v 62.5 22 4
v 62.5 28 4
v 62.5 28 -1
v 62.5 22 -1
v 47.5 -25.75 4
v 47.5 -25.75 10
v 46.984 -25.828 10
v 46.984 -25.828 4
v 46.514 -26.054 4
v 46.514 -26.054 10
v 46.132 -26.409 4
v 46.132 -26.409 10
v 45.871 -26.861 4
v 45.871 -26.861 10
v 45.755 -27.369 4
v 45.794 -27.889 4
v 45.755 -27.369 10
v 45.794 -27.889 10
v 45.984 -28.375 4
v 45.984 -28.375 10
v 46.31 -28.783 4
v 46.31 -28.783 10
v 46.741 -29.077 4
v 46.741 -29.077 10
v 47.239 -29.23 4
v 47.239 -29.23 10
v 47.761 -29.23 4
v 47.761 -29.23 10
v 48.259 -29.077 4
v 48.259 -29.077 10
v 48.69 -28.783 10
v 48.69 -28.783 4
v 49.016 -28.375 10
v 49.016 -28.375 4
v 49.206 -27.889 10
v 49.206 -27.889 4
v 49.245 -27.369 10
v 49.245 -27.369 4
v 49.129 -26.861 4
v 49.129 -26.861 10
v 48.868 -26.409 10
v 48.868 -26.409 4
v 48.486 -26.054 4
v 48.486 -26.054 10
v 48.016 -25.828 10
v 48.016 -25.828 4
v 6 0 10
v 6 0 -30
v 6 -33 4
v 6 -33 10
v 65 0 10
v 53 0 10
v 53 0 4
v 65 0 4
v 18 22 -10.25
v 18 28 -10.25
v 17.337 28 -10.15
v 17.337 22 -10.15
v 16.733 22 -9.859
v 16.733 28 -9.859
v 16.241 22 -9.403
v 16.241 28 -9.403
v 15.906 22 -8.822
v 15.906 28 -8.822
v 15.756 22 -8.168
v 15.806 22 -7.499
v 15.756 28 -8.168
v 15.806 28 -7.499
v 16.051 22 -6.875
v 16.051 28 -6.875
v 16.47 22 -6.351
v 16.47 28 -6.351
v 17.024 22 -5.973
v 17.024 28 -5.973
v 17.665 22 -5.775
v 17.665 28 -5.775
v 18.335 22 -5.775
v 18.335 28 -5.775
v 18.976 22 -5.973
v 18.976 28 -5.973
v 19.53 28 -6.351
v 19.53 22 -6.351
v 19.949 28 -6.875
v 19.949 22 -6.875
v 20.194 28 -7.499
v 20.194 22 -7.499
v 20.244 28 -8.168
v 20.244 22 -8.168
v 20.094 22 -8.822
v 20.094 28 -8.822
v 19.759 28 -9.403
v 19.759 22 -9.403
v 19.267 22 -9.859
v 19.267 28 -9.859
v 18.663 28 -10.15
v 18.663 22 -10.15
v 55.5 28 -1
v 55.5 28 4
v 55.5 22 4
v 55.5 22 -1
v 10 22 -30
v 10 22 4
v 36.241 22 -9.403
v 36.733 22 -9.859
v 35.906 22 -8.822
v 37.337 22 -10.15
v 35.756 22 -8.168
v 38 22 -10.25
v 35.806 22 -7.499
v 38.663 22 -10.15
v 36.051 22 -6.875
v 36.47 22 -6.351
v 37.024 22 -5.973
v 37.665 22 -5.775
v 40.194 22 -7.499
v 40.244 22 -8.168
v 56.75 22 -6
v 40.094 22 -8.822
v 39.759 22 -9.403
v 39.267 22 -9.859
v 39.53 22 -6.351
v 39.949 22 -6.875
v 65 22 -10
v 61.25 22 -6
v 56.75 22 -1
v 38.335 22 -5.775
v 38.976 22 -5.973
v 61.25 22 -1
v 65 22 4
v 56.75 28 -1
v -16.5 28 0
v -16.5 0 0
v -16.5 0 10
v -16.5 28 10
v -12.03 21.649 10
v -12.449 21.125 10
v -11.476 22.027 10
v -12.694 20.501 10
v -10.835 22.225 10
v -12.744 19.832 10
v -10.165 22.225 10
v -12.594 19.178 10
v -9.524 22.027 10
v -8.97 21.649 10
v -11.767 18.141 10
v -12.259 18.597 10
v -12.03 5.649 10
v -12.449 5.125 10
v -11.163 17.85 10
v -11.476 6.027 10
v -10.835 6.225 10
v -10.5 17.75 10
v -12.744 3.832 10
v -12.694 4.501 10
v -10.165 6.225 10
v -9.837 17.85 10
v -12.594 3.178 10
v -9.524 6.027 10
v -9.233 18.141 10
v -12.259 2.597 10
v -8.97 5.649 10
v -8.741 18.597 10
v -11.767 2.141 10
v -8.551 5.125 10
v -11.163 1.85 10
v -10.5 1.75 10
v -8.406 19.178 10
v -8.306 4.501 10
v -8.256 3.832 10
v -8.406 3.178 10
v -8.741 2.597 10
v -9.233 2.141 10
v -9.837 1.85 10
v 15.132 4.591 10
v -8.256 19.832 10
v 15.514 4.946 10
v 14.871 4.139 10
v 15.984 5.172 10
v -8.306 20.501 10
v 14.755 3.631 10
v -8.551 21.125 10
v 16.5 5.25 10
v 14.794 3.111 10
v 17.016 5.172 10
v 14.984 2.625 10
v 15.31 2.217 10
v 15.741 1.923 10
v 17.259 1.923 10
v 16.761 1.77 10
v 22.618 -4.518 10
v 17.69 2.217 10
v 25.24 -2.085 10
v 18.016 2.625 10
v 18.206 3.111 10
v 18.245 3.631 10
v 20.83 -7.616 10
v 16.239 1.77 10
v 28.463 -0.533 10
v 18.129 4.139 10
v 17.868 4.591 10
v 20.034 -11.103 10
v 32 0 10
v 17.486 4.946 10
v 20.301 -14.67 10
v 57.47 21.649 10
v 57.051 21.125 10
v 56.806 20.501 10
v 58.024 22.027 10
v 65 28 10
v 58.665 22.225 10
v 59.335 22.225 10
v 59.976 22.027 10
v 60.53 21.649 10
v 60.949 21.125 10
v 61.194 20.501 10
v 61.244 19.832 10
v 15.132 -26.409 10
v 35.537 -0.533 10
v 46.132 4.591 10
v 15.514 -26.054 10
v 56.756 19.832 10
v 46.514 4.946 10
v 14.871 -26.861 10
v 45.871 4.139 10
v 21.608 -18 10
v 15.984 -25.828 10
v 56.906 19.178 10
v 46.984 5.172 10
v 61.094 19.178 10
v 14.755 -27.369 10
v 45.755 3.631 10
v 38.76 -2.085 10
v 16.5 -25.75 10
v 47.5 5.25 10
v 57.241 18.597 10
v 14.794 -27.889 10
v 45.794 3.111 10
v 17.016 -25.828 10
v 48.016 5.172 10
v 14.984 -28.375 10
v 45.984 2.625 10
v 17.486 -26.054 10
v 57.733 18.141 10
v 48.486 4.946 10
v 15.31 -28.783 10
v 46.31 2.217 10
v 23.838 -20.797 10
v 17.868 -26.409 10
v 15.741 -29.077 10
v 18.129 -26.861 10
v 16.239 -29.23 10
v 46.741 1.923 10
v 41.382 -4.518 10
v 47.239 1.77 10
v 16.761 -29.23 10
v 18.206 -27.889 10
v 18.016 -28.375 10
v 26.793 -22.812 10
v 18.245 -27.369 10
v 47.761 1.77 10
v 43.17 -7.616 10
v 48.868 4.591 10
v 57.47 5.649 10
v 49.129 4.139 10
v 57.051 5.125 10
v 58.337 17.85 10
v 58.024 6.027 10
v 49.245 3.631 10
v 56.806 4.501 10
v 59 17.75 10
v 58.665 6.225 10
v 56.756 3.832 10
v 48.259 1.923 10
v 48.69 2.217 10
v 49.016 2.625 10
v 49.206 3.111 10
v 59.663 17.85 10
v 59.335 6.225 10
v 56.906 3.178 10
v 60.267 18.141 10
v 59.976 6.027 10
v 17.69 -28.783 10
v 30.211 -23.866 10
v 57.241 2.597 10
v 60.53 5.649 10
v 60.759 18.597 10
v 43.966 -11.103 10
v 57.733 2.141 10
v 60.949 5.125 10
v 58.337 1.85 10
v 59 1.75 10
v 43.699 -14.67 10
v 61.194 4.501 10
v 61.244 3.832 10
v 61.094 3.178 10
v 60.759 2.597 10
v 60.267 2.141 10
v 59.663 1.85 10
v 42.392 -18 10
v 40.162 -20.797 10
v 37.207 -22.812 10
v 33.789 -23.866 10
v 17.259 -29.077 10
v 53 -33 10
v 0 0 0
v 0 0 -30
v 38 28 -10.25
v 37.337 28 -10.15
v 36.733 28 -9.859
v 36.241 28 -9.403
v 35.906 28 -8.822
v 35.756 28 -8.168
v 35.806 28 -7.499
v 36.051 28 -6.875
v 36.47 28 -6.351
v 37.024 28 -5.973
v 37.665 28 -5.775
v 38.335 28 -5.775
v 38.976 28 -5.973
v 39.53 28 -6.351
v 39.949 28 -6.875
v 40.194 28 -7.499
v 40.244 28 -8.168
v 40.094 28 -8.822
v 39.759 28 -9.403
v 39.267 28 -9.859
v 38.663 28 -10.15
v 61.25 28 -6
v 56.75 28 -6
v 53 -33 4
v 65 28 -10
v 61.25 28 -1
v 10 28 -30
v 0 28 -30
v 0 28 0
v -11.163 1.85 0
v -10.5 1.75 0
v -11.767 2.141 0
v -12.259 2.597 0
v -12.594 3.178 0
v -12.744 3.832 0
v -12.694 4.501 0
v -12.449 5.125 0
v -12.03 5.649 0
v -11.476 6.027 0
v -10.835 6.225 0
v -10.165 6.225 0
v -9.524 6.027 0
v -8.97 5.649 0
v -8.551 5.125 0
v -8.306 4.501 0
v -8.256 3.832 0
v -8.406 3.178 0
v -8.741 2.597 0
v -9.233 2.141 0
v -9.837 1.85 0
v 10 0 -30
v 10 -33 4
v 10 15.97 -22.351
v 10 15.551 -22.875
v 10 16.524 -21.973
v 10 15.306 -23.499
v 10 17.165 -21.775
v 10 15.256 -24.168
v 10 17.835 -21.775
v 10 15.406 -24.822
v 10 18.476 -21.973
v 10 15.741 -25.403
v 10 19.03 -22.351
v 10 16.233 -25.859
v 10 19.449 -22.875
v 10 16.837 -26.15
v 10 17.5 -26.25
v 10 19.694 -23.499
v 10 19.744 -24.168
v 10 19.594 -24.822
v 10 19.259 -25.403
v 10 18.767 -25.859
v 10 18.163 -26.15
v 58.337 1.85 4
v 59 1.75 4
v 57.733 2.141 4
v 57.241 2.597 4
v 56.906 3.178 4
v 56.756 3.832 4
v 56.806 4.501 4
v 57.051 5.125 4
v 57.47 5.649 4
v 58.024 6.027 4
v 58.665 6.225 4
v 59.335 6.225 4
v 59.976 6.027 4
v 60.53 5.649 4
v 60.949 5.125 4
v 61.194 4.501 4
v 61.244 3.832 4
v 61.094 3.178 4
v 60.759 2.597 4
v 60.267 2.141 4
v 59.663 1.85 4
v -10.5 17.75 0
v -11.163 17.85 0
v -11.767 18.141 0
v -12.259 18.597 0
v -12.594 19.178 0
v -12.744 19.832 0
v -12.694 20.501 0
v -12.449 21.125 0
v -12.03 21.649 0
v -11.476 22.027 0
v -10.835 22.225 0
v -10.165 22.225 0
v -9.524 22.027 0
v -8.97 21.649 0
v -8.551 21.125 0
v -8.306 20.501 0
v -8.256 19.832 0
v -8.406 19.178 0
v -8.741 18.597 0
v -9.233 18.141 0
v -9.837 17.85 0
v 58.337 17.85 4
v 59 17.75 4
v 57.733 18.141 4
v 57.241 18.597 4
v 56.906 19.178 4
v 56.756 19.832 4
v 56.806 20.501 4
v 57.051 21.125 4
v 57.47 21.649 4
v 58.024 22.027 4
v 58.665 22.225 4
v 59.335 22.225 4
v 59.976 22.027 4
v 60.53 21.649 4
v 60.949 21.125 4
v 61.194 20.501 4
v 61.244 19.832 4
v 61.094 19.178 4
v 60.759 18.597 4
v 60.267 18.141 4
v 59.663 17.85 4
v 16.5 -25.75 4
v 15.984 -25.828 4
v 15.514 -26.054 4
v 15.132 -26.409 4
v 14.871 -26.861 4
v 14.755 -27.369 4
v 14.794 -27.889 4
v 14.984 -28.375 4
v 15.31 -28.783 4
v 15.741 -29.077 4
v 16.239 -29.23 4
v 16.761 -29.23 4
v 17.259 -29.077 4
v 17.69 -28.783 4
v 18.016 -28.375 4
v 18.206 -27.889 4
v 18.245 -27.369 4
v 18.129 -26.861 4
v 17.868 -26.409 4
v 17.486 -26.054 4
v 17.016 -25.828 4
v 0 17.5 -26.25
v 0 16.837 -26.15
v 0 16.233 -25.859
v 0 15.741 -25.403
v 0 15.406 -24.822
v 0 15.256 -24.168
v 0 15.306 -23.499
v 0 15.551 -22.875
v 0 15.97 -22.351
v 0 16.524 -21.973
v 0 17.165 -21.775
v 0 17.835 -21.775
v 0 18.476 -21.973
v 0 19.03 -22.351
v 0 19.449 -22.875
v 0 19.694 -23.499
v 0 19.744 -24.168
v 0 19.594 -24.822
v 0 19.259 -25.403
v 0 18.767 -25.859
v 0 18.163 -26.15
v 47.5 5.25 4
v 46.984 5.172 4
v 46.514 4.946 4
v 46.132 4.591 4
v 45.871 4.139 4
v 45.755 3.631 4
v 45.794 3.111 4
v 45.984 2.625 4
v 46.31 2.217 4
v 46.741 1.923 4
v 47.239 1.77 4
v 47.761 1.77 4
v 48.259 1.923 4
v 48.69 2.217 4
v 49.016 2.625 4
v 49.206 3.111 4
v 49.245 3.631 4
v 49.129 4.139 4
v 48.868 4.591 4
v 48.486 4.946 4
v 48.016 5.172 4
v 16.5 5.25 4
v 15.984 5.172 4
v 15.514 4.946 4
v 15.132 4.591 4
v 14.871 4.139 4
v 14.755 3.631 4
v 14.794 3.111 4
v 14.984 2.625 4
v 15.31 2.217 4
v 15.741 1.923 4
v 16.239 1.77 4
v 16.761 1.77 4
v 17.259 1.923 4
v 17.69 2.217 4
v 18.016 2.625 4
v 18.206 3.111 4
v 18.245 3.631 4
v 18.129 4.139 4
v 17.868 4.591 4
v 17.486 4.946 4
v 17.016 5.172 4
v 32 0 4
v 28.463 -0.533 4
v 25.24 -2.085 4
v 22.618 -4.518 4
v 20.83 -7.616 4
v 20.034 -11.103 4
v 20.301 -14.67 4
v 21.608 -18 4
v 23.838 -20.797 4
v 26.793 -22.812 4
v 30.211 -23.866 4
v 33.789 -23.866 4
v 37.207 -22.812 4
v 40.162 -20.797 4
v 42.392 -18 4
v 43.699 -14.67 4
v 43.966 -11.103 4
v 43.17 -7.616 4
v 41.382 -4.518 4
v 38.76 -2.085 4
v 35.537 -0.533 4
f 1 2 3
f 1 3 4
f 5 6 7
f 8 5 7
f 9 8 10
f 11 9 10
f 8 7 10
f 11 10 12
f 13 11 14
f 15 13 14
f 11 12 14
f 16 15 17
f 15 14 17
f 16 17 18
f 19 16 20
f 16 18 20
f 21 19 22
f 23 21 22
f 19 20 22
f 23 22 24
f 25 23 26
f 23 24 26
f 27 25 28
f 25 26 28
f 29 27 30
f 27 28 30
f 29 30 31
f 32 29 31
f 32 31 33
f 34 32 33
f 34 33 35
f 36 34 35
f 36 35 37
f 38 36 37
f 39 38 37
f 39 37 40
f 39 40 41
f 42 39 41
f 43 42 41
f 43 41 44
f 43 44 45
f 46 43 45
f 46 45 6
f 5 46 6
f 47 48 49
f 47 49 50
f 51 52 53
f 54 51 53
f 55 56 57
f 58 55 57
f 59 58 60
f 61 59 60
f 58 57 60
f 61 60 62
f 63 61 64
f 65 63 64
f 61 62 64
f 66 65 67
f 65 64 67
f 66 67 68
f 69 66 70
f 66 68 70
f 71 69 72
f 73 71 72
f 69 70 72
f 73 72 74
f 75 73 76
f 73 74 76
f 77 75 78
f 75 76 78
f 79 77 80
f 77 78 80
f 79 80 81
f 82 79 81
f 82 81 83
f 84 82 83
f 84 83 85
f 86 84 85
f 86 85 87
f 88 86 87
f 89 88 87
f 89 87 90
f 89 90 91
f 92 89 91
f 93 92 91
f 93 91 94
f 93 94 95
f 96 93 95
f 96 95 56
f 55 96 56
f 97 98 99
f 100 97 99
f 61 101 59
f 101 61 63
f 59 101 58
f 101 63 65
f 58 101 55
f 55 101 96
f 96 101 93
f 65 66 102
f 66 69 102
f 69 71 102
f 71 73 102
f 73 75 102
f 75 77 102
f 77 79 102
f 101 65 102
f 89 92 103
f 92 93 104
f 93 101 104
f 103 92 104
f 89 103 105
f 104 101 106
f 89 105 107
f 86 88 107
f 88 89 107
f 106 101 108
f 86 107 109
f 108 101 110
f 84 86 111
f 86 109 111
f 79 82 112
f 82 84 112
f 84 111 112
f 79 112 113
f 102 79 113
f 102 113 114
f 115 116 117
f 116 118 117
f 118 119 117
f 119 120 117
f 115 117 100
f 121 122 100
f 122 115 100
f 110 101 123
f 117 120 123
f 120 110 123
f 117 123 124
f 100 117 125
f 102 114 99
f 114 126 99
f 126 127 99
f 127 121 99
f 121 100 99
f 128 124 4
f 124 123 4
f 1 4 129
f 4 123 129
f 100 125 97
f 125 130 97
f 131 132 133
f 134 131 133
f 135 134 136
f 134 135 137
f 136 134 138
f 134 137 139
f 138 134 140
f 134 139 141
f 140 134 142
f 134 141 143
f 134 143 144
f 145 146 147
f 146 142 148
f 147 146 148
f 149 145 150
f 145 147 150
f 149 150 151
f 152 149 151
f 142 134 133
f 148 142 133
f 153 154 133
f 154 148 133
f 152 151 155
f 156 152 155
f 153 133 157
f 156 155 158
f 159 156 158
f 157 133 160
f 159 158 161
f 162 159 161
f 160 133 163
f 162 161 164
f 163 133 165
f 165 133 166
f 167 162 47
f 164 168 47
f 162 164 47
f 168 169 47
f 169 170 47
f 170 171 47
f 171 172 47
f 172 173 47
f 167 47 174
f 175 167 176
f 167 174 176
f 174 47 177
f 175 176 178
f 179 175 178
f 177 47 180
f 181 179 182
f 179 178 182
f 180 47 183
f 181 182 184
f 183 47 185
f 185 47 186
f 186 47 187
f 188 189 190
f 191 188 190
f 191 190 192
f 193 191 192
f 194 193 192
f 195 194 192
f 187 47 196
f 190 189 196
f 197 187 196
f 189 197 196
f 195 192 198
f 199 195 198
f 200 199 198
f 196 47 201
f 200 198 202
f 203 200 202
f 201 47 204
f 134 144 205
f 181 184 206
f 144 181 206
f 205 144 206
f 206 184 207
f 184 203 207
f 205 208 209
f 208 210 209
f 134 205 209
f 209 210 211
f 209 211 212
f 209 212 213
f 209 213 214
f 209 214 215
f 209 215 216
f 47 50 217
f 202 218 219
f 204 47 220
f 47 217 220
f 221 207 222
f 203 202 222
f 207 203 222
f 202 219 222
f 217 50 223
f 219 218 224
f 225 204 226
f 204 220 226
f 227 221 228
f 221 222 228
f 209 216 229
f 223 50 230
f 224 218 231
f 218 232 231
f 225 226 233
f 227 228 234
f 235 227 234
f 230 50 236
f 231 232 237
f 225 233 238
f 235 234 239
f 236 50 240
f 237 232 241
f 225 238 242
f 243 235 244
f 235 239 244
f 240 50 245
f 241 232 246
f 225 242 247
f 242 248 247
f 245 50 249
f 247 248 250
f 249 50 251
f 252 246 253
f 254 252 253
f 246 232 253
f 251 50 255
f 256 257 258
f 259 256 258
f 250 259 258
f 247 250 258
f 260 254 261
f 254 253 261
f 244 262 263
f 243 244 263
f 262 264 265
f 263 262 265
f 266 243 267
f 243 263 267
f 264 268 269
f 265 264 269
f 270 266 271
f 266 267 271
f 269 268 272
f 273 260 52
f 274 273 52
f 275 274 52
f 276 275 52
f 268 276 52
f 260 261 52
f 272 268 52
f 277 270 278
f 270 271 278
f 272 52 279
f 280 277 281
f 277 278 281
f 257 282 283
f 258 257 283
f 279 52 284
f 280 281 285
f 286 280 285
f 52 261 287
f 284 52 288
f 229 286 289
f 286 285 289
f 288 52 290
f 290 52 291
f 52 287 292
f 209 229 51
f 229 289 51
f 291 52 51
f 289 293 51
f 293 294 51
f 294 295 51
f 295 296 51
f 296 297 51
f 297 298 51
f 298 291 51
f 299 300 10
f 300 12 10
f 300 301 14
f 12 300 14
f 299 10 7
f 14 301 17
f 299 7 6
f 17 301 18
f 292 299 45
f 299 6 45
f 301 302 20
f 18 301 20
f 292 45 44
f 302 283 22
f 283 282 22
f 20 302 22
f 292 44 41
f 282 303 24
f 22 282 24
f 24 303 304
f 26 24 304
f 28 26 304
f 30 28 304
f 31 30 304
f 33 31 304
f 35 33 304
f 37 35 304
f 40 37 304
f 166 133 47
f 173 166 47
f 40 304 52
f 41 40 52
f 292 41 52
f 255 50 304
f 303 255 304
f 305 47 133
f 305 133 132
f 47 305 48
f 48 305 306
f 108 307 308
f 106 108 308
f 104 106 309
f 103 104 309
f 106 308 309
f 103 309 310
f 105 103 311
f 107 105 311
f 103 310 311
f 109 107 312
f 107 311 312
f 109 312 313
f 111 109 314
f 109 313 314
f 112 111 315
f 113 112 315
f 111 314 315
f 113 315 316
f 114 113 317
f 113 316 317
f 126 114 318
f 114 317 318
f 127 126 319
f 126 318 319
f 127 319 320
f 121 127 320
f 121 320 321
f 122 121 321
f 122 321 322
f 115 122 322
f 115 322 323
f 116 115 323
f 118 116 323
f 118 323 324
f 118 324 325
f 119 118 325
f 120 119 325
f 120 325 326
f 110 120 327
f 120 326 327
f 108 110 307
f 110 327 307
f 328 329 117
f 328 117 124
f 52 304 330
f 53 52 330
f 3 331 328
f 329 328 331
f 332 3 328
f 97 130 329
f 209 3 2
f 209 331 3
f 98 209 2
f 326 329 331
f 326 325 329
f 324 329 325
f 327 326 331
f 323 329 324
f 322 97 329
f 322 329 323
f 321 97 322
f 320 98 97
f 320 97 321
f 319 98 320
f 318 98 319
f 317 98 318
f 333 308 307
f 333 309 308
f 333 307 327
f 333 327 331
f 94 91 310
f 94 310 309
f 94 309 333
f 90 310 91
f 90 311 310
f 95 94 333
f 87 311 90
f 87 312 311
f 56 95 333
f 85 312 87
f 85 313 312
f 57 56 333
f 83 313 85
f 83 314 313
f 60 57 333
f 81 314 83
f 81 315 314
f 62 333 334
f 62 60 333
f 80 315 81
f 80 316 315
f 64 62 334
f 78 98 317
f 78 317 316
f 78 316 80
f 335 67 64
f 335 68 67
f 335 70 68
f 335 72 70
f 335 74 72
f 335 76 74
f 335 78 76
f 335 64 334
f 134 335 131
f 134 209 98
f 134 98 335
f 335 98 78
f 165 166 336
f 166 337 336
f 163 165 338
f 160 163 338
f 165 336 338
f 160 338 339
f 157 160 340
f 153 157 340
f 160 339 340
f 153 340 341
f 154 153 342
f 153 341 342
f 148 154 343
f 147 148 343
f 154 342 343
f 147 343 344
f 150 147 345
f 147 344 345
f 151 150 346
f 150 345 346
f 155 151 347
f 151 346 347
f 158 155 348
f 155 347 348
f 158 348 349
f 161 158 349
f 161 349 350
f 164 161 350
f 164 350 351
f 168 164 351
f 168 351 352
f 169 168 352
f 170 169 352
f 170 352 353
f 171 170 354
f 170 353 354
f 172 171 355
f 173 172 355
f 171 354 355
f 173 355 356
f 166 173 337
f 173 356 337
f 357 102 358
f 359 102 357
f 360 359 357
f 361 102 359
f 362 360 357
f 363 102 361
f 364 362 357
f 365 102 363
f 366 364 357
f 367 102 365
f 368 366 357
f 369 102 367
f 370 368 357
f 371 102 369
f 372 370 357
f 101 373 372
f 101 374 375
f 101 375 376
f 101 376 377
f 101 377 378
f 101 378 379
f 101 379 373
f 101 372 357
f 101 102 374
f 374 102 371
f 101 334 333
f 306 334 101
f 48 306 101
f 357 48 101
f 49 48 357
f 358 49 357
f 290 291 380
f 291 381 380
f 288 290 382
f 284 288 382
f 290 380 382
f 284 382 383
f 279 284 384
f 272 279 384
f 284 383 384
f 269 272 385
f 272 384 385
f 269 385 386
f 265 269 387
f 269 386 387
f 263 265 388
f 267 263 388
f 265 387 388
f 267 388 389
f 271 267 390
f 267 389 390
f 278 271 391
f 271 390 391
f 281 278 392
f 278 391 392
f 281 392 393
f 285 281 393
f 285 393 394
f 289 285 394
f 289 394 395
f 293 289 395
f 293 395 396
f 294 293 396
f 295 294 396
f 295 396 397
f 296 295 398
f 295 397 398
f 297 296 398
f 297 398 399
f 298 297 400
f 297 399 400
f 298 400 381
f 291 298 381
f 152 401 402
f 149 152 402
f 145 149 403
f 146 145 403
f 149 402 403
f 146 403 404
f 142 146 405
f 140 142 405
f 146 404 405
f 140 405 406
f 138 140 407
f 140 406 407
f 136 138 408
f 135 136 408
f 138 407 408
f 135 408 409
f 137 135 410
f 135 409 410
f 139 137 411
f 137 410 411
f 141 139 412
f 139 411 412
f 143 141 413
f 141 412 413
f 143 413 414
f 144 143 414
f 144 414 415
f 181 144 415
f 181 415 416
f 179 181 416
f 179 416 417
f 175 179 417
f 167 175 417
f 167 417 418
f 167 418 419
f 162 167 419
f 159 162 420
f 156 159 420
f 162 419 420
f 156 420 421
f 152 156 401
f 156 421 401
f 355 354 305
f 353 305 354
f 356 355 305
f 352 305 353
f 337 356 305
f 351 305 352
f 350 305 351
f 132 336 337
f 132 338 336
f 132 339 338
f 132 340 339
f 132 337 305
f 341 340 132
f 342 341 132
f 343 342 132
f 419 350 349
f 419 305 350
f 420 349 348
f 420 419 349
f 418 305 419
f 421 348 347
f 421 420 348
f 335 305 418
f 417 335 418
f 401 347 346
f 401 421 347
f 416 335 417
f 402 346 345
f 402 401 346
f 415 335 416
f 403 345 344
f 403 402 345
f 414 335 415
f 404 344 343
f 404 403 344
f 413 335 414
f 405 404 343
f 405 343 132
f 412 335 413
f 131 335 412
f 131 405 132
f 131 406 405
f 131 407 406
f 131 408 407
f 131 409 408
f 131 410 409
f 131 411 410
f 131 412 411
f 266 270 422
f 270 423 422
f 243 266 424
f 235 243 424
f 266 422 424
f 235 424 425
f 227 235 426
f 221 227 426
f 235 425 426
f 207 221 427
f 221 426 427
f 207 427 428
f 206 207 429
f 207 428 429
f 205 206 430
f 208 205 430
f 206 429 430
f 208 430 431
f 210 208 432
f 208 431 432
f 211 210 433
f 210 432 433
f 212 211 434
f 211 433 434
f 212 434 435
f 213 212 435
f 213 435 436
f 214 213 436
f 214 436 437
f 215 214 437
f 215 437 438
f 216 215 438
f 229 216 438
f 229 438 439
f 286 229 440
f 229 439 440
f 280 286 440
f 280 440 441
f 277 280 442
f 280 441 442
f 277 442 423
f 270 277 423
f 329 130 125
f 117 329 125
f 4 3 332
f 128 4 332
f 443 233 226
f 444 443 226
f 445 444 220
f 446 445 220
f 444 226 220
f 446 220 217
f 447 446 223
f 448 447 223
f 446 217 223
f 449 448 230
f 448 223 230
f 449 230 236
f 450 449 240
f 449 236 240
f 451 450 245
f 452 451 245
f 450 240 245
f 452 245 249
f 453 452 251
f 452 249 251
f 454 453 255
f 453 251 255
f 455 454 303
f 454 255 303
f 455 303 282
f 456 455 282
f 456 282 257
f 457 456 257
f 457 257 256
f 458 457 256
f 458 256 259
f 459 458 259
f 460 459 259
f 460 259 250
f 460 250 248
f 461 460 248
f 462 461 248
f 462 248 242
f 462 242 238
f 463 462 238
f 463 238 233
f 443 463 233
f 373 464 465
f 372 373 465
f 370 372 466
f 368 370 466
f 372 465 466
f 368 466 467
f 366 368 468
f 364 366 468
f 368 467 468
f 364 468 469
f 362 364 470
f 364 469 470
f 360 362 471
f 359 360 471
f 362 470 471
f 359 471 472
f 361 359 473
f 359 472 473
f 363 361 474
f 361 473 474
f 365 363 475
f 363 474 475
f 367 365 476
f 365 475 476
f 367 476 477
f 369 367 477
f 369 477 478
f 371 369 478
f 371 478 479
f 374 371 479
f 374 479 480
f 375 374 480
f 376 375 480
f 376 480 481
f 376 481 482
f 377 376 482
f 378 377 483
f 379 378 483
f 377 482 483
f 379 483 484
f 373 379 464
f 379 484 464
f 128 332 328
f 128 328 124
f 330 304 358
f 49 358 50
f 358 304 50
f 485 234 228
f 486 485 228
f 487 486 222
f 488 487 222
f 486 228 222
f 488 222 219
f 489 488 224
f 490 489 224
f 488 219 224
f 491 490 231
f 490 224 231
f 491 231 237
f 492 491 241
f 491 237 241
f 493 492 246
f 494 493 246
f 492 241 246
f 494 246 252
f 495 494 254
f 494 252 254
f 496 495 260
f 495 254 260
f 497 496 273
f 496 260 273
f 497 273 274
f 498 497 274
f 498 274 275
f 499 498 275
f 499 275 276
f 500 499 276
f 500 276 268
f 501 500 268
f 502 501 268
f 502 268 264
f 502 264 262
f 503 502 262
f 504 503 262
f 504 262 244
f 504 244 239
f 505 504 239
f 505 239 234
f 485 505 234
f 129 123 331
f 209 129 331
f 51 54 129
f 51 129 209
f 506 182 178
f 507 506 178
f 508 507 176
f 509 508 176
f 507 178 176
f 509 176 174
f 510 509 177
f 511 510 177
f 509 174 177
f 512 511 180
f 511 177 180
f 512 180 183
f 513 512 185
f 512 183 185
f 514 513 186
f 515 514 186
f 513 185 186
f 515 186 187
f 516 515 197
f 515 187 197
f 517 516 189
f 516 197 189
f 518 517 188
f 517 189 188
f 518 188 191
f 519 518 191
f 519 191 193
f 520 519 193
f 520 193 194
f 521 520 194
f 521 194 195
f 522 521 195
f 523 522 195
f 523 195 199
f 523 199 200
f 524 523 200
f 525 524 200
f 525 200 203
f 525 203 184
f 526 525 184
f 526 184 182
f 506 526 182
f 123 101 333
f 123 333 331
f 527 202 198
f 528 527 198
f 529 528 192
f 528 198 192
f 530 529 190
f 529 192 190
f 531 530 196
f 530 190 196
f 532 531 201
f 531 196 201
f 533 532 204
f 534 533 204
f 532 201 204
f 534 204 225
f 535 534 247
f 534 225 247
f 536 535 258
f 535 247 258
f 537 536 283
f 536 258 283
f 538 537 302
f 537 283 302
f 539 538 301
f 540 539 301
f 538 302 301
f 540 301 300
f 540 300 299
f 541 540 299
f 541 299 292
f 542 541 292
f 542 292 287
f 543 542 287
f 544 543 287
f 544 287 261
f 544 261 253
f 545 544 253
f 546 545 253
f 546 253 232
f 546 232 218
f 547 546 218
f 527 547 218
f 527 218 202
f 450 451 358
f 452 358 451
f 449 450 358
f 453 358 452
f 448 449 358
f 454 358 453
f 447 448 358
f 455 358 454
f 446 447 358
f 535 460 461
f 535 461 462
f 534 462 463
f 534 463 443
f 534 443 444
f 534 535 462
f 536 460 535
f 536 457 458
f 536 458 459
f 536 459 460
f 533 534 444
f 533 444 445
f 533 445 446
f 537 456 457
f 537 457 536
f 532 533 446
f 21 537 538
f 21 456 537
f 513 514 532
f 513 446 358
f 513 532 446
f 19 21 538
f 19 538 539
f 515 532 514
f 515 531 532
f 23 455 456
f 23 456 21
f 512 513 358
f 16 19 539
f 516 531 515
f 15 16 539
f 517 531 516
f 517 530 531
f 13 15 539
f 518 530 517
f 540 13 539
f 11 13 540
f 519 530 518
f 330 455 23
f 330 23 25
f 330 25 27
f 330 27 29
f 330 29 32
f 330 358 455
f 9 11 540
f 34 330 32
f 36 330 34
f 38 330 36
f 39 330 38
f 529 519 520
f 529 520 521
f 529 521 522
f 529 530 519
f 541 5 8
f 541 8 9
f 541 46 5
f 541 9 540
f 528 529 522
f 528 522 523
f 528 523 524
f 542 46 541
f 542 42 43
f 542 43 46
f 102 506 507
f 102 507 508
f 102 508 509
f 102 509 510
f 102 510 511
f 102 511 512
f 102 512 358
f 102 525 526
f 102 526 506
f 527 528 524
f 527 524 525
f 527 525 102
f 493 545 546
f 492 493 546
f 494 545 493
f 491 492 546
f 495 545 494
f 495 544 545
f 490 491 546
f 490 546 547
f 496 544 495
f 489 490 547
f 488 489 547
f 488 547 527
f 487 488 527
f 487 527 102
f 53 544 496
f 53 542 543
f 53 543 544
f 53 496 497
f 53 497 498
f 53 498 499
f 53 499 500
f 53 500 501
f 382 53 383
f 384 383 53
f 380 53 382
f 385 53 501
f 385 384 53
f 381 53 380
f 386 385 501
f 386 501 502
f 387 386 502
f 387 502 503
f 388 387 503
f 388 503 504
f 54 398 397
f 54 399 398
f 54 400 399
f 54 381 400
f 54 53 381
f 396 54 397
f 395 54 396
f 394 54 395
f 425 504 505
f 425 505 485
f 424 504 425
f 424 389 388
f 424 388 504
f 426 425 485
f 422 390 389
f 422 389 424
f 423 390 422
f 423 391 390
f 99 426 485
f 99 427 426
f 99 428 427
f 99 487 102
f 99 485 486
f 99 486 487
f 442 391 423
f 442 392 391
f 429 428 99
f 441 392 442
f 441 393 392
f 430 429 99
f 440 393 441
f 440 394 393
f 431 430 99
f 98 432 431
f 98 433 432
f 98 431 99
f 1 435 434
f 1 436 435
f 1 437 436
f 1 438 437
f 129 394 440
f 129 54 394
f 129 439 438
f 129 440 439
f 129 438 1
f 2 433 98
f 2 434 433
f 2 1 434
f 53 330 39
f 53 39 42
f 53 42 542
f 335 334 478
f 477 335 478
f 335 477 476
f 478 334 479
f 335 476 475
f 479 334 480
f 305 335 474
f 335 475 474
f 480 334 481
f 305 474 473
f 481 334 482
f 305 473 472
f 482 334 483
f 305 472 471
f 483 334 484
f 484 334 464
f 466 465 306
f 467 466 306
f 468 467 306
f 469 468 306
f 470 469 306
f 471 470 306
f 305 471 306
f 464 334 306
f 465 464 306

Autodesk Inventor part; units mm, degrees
ref_plane "YZ Plane" through (0, 0, 0) normal (1, 0, 0) x (0, 1, 0)
ref_plane "XY Plane" through (0, 0, 0) normal (0, 0, 1) x (1, 0, 0)
ref_plane "Work Plane1" through (0, -33, 0) normal (0, 1, 0) x (-1, 0, 0)
sketch "Sketch1" plane through (0, -33, 0) normal (0, 1, 0) x (-1, 0, 0)
  line L0 (-65, -10) -> (-65, 10)
  line L1 (16.5, -30) -> (16.5, 10)
  line L2 (16.5, 10) -> (-65, 10)
  line L3 (-10, -30) -> (-65, -10)
  line L4 (16.5, -30) -> (-10, -30)
extrude "Extrusion7" add sketch "Sketch1" along normal blind 61
sketch "Sketch2" plane through (65, -33, 10) normal (1, 0, 0) x (0, 0, -1)
  line L0 (6, 0) -> (40, 0)
  line L1 (40, 55) -> (40, 0)
  line L2 (6, 0) -> (6, 55)
  line L3 (40, 55) -> (6, 55)
extrude "Extrusion6" cut sketch "Sketch2" against normal blind 55
sketch "Sketch3" plane through (65, -33, 10) normal (1, 0, 0) x (0, 0, -1)
  line L0 (0, 33) -> (6, 33)
  line L1 (0, 0) -> (6, 0)
  line L2 (6, 0) -> (6, 33)
  line L3 (0, 0) -> (0, 33)
extrude "Extrusion5" cut sketch "Sketch3" against normal blind 12
sketch "Sketch4" plane through (-16.5, -33, -30) normal (-1, 0, 0) x (0, 0, 1)
  line L0 (0, 0) -> (40, 0)
  line L1 (0, 33) -> (0, 0)
  line L2 (40, 33) -> (0, 33)
  line L3 (40, 0) -> (40, 33)
extrude "Extrusion4" cut sketch "Sketch4" against normal blind 22.5
sketch "Sketch5" plane through (65, 22, 4) normal (0, 0, -1) x (-1, 0, 0)
  line L0 (9.5, 0) -> (2.5, 0)
  line L1 (9.5, 6) -> (2.5, 6)
  line L2 (9.5, 6) -> (9.5, 0)
  line L3 (2.5, 6) -> (2.5, 0)
extrude "Extrusion3" cut sketch "Sketch5" along normal blind 5
sketch "Sketch6" plane through (10, 28, -30) normal (0, 0, -1) x (-1, 0, 0)
  line L0 (10, 0) -> (26.5, 0)
  line L1 (26.5, 0) -> (26.5, -28)
  line L2 (10, -28) -> (26.5, -28)
  line L3 (10, 0) -> (10, -28)
extrude "Extrusion2" cut sketch "Sketch6" against normal blind 30
sketch "Sketch7" plane through (65, 22, -1) normal (0, 0, 1) x (1, 0, 0)
  line L0 (-8.25, 0) -> (-3.75, 0)
  line L1 (-3.75, 6) -> (-3.75, 0)
  line L2 (-8.25, 6) -> (-8.25, 0)
  line L3 (-8.25, 6) -> (-3.75, 6)
extrude "Extrusion1" cut sketch "Sketch7" against normal blind 5 draft 0
chamfer "Chamfer1" distance 34 distance2 33 1 edges at (8, -33, -30) measured on face at (23, -33, 8)
hole "Hole12" at (38, 22, -8) direction (0, 1, 0) diameter 4.5 depth 6
hole "Hole11" at (18, 22, -8) direction (0, 1, 0) diameter 4.5 depth 6
hole "Hole10" at (10, 17.5, -24) direction (-1, 0, 0) diameter 4.5 depth 10
hole "Hole9" at (59, 20, 10) direction (0, 0, -1) diameter 4.5 depth 6
hole "Hole8" at (59, 4, 10) direction (0, 0, -1) diameter 4.5 depth 6
hole "Hole7" at (-10.5, 20, 10) direction (0, 0, -1) diameter 4.5 depth 10
sketch "Sketch13" plane through (-16.5, 28, 10) normal (0, 0, 1) x (1, 0, 0)
  point P0 (6, -8)
hole "Hole6" at (47.5, 3.5, 4) direction (0, 0, 1) diameter 3.5 depth 6
sketch "Sketch12" plane through (-16.5, 28, 10) normal (0, 0, 1) x (1, 0, 0)
  point P0 (75.5, -24)
hole "Hole5" at (47.5, -27.5, 4) direction (0, 0, 1) diameter 3.5 depth 6
sketch "Sketch11" plane through (-16.5, 28, 10) normal (0, 0, 1) x (1, 0, 0)
  point P0 (75.5, -8)
hole "Hole4" at (16.5, -27.5, 4) direction (0, 0, 1) diameter 3.5 depth 6
sketch "Sketch10" plane through (10, -33, 10) normal (1, 0, 0) x (0, 0, -1)
  point P0 (34, 50.5)
hole "Hole3" at (16.5, 3.5, 4) direction (0, 0, 1) diameter 3.5 depth 6
sketch "Sketch9" plane through (65, 22, -10) normal (0, -1, 0) x (1, 0, 0)
  point P0 (-47, 2)
hole "Hole2" at (32, -12, 4) direction (0, 0, 1) diameter 24 depth 6
sketch "Sketch8" plane through (65, 22, -10) normal (0, -1, 0) x (1, 0, 0)
  point P0 (-27, 2)
hole "Hole1" at (-10.5, 4, 10) direction (0, 0, -1) diameter 4.5 depth 10
sketch "Sketch14" plane through (65, 0, 4) normal (0, 0, -1) x (-1, 0, 0)
  point P0 (17.5, 3.5)
sketch "Sketch15" plane through (65, 0, 4) normal (0, 0, -1) x (-1, 0, 0)
  point P0 (17.5, -27.5)
sketch "Sketch16" plane through (65, 0, 4) normal (0, 0, -1) x (-1, 0, 0)
  point P0 (48.5, -27.5)
sketch "Sketch17" plane through (65, 0, 4) normal (0, 0, -1) x (-1, 0, 0)
  point P0 (48.5, 3.5)
sketch "Sketch18" plane through (65, 0, 4) normal (0, 0, -1) x (-1, 0, 0)
  point P0 (33, -12)
sketch "Sketch19" plane through (-16.5, 28, 10) normal (0, 0, 1) x (1, 0, 0)
  point P0 (6, -24)
properties part number "Hopper Motor Holder" material "ASA Plastic"
